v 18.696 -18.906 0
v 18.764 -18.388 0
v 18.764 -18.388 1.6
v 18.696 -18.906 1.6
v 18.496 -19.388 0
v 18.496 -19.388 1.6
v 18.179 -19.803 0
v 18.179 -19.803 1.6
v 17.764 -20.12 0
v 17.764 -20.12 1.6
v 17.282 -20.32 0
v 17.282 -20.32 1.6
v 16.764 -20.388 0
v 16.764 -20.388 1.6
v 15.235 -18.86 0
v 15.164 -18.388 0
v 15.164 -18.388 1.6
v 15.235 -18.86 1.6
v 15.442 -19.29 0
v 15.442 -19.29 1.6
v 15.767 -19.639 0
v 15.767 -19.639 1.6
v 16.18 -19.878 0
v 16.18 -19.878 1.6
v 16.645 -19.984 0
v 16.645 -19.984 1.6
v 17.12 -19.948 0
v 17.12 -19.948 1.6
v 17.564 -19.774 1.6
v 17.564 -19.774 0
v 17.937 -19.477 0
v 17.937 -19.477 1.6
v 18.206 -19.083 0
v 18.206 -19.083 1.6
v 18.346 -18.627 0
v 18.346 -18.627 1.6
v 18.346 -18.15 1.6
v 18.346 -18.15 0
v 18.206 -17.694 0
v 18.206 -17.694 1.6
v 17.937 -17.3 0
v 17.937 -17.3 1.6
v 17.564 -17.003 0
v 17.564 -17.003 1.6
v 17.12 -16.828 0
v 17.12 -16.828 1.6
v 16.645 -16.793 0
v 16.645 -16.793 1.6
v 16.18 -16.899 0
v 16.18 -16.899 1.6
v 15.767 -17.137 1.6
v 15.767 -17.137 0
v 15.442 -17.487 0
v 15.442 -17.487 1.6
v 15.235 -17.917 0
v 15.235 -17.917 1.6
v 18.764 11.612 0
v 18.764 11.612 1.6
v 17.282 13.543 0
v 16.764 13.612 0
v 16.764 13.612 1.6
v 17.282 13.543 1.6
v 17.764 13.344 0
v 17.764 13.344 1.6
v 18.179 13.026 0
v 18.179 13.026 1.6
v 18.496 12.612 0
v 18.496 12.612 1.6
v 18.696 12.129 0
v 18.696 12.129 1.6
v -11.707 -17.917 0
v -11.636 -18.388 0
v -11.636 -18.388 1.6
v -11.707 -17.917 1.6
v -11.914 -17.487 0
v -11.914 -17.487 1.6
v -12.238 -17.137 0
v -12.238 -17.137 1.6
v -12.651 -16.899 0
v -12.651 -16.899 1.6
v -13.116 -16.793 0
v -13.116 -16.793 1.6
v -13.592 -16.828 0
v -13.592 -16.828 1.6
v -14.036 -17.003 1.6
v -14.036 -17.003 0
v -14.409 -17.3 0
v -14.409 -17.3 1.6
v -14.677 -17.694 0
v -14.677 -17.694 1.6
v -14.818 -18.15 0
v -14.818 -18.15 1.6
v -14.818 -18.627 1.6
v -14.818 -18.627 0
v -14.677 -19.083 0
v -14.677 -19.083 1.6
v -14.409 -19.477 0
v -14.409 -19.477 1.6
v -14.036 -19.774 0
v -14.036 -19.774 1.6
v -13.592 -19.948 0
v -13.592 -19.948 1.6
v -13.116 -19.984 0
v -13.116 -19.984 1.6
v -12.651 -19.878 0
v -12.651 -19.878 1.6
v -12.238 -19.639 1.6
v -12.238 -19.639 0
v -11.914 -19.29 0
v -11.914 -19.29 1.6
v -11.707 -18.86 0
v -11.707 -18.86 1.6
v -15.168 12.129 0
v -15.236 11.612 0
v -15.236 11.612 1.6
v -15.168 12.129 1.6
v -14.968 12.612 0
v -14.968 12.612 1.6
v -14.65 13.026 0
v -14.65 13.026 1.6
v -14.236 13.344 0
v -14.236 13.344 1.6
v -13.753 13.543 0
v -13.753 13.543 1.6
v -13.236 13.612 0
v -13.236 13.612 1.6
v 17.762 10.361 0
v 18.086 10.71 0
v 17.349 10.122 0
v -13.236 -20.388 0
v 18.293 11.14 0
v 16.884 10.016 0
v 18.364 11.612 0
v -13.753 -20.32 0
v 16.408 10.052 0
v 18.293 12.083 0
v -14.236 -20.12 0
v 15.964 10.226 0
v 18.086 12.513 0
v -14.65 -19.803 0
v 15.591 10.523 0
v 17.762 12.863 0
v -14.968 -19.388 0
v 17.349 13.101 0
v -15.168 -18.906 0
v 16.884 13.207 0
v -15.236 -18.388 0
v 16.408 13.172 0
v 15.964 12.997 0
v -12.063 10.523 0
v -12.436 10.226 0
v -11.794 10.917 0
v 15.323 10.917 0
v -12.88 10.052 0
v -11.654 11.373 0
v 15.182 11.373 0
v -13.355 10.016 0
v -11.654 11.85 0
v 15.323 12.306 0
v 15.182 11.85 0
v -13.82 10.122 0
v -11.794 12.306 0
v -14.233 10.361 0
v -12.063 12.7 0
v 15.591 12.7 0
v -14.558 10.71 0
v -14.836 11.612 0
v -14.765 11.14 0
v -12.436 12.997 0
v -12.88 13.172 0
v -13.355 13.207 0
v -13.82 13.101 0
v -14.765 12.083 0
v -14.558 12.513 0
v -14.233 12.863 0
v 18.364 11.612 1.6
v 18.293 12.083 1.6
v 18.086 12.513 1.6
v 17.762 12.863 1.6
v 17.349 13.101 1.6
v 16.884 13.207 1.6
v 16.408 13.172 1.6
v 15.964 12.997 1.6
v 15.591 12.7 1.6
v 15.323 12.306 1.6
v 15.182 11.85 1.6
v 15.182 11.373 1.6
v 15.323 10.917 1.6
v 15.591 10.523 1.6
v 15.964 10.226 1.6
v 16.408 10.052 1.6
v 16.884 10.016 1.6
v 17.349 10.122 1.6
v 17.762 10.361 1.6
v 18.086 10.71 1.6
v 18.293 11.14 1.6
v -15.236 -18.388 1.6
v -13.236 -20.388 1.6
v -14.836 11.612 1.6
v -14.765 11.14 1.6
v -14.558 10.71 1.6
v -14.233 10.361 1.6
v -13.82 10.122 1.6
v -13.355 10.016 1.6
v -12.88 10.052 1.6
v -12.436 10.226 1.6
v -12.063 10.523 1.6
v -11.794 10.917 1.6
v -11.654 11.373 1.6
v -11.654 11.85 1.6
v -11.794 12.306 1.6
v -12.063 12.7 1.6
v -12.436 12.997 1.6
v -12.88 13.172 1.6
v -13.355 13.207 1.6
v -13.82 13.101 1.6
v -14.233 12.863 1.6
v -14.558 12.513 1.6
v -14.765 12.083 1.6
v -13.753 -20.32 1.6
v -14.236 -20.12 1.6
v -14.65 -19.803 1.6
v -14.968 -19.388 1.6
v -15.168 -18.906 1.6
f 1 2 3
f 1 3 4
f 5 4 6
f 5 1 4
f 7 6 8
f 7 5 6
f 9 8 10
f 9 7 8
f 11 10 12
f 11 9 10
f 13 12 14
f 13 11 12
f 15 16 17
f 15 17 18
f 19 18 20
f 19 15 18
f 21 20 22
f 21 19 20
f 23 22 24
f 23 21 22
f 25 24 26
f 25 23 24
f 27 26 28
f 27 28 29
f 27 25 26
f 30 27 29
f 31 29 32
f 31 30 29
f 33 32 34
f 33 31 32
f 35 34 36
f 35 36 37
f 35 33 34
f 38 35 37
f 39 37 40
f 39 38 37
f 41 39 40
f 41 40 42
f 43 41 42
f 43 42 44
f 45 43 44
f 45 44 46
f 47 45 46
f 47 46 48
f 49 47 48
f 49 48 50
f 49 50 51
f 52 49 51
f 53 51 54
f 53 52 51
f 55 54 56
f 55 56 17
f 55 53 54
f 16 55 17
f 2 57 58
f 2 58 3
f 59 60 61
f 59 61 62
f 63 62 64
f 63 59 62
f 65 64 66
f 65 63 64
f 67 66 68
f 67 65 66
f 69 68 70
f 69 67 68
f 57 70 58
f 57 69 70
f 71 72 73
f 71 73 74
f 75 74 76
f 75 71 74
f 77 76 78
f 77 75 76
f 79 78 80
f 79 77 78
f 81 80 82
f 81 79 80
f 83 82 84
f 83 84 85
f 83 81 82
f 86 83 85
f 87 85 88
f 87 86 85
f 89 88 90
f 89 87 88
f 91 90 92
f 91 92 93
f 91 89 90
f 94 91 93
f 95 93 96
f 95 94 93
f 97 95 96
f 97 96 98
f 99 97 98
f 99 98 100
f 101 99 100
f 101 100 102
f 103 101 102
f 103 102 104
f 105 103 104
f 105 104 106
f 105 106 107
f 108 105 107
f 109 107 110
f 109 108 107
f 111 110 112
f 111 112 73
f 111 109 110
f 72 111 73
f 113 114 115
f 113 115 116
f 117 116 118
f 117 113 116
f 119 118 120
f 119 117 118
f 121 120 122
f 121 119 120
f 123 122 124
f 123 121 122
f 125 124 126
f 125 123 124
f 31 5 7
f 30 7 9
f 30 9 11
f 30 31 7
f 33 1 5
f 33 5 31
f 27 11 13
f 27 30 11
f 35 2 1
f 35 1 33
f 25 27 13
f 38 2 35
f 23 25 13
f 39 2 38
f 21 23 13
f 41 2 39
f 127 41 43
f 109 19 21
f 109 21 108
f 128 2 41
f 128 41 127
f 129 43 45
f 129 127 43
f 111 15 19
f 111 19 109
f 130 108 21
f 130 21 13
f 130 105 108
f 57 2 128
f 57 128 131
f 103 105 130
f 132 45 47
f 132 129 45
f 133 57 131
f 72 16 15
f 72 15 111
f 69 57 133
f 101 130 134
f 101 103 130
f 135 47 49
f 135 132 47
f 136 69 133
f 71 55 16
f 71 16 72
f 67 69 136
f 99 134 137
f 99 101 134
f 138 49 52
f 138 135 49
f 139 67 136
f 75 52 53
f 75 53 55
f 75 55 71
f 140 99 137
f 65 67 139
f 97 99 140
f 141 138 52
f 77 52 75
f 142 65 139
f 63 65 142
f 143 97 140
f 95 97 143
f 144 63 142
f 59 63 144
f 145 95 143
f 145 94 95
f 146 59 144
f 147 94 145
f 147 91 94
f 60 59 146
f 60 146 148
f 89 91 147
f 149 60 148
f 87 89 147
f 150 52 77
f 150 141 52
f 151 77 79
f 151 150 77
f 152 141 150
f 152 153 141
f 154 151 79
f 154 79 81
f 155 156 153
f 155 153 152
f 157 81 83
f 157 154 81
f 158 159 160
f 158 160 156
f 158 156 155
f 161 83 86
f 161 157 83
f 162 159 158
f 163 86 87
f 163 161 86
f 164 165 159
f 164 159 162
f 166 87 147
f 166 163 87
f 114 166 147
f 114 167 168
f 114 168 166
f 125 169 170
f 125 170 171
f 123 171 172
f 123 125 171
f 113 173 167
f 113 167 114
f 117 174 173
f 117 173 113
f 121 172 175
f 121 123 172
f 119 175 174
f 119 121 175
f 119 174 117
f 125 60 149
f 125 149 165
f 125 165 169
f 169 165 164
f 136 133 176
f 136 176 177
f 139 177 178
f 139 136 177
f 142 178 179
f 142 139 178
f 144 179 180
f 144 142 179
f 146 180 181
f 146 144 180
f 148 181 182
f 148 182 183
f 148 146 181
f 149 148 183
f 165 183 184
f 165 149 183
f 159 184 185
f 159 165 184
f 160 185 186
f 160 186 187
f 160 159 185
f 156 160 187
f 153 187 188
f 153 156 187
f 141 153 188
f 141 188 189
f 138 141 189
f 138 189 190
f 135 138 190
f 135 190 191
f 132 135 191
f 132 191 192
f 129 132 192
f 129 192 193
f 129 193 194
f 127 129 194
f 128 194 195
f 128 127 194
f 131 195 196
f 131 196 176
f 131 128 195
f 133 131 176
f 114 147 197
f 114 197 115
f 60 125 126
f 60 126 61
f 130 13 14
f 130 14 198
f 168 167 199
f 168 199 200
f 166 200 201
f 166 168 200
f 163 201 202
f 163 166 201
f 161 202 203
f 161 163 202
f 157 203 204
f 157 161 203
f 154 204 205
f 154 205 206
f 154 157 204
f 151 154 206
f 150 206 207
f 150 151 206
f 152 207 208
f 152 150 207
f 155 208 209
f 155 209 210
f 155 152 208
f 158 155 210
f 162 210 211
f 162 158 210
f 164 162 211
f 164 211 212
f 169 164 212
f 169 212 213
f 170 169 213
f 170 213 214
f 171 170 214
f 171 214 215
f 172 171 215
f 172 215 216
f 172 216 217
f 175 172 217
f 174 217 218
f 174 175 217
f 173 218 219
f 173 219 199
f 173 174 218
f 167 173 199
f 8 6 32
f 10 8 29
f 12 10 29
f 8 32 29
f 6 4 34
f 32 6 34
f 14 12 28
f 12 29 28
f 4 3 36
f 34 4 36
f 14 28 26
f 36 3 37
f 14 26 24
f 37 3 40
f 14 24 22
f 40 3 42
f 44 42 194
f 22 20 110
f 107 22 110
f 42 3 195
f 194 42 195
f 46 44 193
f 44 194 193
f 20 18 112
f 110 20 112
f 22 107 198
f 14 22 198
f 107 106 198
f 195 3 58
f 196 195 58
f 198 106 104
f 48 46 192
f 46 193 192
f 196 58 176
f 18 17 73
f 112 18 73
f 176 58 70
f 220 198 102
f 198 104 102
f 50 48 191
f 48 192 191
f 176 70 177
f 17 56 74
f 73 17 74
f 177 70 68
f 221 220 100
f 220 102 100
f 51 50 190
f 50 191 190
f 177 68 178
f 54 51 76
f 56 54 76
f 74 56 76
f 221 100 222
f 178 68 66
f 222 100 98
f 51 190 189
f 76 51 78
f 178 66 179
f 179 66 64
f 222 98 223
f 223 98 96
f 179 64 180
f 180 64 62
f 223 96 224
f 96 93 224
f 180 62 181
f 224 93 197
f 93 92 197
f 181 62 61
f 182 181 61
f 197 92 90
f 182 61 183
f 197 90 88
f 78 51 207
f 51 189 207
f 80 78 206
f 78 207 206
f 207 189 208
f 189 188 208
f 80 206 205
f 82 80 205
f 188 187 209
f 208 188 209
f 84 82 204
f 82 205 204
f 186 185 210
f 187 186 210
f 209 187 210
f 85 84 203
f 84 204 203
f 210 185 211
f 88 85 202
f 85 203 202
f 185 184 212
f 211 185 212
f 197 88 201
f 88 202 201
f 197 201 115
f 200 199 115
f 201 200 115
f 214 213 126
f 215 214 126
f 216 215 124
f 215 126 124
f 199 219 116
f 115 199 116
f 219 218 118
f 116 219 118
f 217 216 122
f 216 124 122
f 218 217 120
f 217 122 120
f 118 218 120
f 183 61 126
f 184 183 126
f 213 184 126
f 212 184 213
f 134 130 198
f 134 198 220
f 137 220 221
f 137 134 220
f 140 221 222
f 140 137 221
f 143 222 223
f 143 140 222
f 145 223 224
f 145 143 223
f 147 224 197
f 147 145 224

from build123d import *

# Parameters (mm, degrees)
SKETCH1_R           = 1.6
BOSS_EXTRUDE1_DEPTH = 1.6


with BuildPart() as part:
    # Sketch1 → Boss-Extrude1 (new body)
    with BuildSketch(Plane.XY):
        with BuildLine():
            Line((-13.235657624, 13.611622239), (16.764342376, 13.611622239))
            ThreePointArc((16.764342376, 13.611622239), (18.178555938, 13.025835801), (18.764342376, 11.611622239))
            Line((18.764342376, 11.611622239), (18.764342376, -18.388377761))
            ThreePointArc((18.764342376, -18.388377761), (18.178555938, -19.802591324), (16.764342376, -20.388377761))
            Line((16.764342376, -20.388377761), (-13.235657624, -20.388377761))
            ThreePointArc((-13.235657624, -20.388377761), (-14.649871187, -19.802591324), (-15.235657624, -18.388377761))
            Line((-15.235657624, -18.388377761), (-15.235657624, 11.611622239))
            ThreePointArc((-15.235657624, 11.611622239), (-14.649871187, 13.025835801), (-13.235657624, 13.611622239))
        make_face()
        with Locations((16.764342376, 11.611622239)):
            Circle(SKETCH1_R, mode=Mode.SUBTRACT)
        with Locations(Location((16.764342376, -18.388377761, 0), (0, 0, 180))):
            Circle(SKETCH1_R, mode=Mode.SUBTRACT)
        with Locations(Location((-13.235657624, 11.611622239, 0), (0, 0, 180))):
            Circle(SKETCH1_R, mode=Mode.SUBTRACT)
        with Locations((-13.235657624, -18.388377761)):
            Circle(SKETCH1_R, mode=Mode.SUBTRACT)
    extrude(amount=BOSS_EXTRUDE1_DEPTH)


solid = part.part
